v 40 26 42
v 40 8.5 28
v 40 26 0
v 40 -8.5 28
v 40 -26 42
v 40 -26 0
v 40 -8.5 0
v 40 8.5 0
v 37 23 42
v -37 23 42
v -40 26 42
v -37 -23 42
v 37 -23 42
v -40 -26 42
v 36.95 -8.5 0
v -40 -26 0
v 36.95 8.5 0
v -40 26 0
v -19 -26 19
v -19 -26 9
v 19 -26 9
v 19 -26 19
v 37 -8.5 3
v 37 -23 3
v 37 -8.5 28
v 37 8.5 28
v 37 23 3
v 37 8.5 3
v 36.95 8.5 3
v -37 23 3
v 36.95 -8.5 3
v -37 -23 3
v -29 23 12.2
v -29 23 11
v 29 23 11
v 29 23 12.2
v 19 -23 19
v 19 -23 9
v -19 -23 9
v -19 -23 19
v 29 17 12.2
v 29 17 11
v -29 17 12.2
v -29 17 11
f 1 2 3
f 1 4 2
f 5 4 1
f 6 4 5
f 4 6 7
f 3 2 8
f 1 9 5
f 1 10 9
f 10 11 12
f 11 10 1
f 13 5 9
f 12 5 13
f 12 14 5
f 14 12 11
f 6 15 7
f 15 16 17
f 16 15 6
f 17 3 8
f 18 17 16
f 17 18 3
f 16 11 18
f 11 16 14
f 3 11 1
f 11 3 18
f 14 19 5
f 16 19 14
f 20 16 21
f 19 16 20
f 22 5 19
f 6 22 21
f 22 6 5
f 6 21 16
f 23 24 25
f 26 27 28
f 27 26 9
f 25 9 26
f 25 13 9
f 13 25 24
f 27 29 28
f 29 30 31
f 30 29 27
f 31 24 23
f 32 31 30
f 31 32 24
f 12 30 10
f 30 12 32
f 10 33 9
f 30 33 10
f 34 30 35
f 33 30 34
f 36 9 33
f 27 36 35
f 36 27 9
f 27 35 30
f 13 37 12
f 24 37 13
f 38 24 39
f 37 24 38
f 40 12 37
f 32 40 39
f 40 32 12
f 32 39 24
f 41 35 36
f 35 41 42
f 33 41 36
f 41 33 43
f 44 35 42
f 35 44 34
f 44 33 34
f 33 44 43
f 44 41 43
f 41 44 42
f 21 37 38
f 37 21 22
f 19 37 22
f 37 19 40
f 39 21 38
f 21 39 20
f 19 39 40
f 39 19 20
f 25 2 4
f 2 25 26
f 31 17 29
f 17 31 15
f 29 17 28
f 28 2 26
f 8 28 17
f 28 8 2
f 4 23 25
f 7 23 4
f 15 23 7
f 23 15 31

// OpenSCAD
// Parameters (mm)
$fn = 64;
eps = 0.05;

// Enclosure dimensions
outer_width = 80;
outer_depth = 52;
outer_height = 42;
wall_thickness = 3;
bottom_thickness = 3;

// Derived interior dimensions
inner_width = outer_width - 2 * wall_thickness;
inner_depth = outer_depth - 2 * wall_thickness;
inner_height = outer_height - bottom_thickness;

// Front horizontal through opening
front_slot_width = 38;
front_slot_height = 10;
front_slot_bottom_z = 9;
front_slot_depth = wall_thickness + 2 * eps;

// Right side vertical through opening
side_open_width = 17;
side_open_height = 28;
side_open_y_offset = 0;
side_open_depth = wall_thickness + 2 * eps;

// Interior thin ledge along rear wall
ledge_end_margin = 8;
ledge_length = inner_width - 2 * ledge_end_margin;
ledge_projection = 6;
ledge_thickness = 1.2;
ledge_z = bottom_thickness + 8;
ledge_wall_overlap = 0.3;

// Solid outside block
module outer_body() {
    translate([-outer_width / 2, -outer_depth / 2, 0])
        cube([outer_width, outer_depth, outer_height]);
}

// Open-top hollow cavity
module inner_cavity_cut() {
    translate([-inner_width / 2, -inner_depth / 2, bottom_thickness])
        cube([inner_width, inner_depth, inner_height + eps]);
}

// Straight rectangular enclosure shell
module enclosure_shell() {
    difference() {
        outer_body();
        inner_cavity_cut();
    }
}

// Removed horizontal side feature on front wall
module front_horizontal_cut() {
    translate([
        -front_slot_width / 2,
        -outer_depth / 2 - eps,
        front_slot_bottom_z
    ])
        cube([front_slot_width, front_slot_depth, front_slot_height]);
}

// Removed vertical side feature on right wall
module right_vertical_cut() {
    translate([
        outer_width / 2 - wall_thickness - eps,
        side_open_y_offset - side_open_width / 2,
        -eps
    ])
        cube([side_open_depth, side_open_width, side_open_height + eps]);
}

// Thin internal ledge attached to rear inner wall
module rear_inner_ledge() {
    translate([
        -ledge_length / 2,
        outer_depth / 2 - wall_thickness - ledge_projection,
        ledge_z
    ])
        cube([
            ledge_length,
            ledge_projection + ledge_wall_overlap,
            ledge_thickness
        ]);
}

// Final model
difference() {
    union() {
        enclosure_shell();
        rear_inner_ledge();
    }

    front_horizontal_cut();
    right_vertical_cut();
}
